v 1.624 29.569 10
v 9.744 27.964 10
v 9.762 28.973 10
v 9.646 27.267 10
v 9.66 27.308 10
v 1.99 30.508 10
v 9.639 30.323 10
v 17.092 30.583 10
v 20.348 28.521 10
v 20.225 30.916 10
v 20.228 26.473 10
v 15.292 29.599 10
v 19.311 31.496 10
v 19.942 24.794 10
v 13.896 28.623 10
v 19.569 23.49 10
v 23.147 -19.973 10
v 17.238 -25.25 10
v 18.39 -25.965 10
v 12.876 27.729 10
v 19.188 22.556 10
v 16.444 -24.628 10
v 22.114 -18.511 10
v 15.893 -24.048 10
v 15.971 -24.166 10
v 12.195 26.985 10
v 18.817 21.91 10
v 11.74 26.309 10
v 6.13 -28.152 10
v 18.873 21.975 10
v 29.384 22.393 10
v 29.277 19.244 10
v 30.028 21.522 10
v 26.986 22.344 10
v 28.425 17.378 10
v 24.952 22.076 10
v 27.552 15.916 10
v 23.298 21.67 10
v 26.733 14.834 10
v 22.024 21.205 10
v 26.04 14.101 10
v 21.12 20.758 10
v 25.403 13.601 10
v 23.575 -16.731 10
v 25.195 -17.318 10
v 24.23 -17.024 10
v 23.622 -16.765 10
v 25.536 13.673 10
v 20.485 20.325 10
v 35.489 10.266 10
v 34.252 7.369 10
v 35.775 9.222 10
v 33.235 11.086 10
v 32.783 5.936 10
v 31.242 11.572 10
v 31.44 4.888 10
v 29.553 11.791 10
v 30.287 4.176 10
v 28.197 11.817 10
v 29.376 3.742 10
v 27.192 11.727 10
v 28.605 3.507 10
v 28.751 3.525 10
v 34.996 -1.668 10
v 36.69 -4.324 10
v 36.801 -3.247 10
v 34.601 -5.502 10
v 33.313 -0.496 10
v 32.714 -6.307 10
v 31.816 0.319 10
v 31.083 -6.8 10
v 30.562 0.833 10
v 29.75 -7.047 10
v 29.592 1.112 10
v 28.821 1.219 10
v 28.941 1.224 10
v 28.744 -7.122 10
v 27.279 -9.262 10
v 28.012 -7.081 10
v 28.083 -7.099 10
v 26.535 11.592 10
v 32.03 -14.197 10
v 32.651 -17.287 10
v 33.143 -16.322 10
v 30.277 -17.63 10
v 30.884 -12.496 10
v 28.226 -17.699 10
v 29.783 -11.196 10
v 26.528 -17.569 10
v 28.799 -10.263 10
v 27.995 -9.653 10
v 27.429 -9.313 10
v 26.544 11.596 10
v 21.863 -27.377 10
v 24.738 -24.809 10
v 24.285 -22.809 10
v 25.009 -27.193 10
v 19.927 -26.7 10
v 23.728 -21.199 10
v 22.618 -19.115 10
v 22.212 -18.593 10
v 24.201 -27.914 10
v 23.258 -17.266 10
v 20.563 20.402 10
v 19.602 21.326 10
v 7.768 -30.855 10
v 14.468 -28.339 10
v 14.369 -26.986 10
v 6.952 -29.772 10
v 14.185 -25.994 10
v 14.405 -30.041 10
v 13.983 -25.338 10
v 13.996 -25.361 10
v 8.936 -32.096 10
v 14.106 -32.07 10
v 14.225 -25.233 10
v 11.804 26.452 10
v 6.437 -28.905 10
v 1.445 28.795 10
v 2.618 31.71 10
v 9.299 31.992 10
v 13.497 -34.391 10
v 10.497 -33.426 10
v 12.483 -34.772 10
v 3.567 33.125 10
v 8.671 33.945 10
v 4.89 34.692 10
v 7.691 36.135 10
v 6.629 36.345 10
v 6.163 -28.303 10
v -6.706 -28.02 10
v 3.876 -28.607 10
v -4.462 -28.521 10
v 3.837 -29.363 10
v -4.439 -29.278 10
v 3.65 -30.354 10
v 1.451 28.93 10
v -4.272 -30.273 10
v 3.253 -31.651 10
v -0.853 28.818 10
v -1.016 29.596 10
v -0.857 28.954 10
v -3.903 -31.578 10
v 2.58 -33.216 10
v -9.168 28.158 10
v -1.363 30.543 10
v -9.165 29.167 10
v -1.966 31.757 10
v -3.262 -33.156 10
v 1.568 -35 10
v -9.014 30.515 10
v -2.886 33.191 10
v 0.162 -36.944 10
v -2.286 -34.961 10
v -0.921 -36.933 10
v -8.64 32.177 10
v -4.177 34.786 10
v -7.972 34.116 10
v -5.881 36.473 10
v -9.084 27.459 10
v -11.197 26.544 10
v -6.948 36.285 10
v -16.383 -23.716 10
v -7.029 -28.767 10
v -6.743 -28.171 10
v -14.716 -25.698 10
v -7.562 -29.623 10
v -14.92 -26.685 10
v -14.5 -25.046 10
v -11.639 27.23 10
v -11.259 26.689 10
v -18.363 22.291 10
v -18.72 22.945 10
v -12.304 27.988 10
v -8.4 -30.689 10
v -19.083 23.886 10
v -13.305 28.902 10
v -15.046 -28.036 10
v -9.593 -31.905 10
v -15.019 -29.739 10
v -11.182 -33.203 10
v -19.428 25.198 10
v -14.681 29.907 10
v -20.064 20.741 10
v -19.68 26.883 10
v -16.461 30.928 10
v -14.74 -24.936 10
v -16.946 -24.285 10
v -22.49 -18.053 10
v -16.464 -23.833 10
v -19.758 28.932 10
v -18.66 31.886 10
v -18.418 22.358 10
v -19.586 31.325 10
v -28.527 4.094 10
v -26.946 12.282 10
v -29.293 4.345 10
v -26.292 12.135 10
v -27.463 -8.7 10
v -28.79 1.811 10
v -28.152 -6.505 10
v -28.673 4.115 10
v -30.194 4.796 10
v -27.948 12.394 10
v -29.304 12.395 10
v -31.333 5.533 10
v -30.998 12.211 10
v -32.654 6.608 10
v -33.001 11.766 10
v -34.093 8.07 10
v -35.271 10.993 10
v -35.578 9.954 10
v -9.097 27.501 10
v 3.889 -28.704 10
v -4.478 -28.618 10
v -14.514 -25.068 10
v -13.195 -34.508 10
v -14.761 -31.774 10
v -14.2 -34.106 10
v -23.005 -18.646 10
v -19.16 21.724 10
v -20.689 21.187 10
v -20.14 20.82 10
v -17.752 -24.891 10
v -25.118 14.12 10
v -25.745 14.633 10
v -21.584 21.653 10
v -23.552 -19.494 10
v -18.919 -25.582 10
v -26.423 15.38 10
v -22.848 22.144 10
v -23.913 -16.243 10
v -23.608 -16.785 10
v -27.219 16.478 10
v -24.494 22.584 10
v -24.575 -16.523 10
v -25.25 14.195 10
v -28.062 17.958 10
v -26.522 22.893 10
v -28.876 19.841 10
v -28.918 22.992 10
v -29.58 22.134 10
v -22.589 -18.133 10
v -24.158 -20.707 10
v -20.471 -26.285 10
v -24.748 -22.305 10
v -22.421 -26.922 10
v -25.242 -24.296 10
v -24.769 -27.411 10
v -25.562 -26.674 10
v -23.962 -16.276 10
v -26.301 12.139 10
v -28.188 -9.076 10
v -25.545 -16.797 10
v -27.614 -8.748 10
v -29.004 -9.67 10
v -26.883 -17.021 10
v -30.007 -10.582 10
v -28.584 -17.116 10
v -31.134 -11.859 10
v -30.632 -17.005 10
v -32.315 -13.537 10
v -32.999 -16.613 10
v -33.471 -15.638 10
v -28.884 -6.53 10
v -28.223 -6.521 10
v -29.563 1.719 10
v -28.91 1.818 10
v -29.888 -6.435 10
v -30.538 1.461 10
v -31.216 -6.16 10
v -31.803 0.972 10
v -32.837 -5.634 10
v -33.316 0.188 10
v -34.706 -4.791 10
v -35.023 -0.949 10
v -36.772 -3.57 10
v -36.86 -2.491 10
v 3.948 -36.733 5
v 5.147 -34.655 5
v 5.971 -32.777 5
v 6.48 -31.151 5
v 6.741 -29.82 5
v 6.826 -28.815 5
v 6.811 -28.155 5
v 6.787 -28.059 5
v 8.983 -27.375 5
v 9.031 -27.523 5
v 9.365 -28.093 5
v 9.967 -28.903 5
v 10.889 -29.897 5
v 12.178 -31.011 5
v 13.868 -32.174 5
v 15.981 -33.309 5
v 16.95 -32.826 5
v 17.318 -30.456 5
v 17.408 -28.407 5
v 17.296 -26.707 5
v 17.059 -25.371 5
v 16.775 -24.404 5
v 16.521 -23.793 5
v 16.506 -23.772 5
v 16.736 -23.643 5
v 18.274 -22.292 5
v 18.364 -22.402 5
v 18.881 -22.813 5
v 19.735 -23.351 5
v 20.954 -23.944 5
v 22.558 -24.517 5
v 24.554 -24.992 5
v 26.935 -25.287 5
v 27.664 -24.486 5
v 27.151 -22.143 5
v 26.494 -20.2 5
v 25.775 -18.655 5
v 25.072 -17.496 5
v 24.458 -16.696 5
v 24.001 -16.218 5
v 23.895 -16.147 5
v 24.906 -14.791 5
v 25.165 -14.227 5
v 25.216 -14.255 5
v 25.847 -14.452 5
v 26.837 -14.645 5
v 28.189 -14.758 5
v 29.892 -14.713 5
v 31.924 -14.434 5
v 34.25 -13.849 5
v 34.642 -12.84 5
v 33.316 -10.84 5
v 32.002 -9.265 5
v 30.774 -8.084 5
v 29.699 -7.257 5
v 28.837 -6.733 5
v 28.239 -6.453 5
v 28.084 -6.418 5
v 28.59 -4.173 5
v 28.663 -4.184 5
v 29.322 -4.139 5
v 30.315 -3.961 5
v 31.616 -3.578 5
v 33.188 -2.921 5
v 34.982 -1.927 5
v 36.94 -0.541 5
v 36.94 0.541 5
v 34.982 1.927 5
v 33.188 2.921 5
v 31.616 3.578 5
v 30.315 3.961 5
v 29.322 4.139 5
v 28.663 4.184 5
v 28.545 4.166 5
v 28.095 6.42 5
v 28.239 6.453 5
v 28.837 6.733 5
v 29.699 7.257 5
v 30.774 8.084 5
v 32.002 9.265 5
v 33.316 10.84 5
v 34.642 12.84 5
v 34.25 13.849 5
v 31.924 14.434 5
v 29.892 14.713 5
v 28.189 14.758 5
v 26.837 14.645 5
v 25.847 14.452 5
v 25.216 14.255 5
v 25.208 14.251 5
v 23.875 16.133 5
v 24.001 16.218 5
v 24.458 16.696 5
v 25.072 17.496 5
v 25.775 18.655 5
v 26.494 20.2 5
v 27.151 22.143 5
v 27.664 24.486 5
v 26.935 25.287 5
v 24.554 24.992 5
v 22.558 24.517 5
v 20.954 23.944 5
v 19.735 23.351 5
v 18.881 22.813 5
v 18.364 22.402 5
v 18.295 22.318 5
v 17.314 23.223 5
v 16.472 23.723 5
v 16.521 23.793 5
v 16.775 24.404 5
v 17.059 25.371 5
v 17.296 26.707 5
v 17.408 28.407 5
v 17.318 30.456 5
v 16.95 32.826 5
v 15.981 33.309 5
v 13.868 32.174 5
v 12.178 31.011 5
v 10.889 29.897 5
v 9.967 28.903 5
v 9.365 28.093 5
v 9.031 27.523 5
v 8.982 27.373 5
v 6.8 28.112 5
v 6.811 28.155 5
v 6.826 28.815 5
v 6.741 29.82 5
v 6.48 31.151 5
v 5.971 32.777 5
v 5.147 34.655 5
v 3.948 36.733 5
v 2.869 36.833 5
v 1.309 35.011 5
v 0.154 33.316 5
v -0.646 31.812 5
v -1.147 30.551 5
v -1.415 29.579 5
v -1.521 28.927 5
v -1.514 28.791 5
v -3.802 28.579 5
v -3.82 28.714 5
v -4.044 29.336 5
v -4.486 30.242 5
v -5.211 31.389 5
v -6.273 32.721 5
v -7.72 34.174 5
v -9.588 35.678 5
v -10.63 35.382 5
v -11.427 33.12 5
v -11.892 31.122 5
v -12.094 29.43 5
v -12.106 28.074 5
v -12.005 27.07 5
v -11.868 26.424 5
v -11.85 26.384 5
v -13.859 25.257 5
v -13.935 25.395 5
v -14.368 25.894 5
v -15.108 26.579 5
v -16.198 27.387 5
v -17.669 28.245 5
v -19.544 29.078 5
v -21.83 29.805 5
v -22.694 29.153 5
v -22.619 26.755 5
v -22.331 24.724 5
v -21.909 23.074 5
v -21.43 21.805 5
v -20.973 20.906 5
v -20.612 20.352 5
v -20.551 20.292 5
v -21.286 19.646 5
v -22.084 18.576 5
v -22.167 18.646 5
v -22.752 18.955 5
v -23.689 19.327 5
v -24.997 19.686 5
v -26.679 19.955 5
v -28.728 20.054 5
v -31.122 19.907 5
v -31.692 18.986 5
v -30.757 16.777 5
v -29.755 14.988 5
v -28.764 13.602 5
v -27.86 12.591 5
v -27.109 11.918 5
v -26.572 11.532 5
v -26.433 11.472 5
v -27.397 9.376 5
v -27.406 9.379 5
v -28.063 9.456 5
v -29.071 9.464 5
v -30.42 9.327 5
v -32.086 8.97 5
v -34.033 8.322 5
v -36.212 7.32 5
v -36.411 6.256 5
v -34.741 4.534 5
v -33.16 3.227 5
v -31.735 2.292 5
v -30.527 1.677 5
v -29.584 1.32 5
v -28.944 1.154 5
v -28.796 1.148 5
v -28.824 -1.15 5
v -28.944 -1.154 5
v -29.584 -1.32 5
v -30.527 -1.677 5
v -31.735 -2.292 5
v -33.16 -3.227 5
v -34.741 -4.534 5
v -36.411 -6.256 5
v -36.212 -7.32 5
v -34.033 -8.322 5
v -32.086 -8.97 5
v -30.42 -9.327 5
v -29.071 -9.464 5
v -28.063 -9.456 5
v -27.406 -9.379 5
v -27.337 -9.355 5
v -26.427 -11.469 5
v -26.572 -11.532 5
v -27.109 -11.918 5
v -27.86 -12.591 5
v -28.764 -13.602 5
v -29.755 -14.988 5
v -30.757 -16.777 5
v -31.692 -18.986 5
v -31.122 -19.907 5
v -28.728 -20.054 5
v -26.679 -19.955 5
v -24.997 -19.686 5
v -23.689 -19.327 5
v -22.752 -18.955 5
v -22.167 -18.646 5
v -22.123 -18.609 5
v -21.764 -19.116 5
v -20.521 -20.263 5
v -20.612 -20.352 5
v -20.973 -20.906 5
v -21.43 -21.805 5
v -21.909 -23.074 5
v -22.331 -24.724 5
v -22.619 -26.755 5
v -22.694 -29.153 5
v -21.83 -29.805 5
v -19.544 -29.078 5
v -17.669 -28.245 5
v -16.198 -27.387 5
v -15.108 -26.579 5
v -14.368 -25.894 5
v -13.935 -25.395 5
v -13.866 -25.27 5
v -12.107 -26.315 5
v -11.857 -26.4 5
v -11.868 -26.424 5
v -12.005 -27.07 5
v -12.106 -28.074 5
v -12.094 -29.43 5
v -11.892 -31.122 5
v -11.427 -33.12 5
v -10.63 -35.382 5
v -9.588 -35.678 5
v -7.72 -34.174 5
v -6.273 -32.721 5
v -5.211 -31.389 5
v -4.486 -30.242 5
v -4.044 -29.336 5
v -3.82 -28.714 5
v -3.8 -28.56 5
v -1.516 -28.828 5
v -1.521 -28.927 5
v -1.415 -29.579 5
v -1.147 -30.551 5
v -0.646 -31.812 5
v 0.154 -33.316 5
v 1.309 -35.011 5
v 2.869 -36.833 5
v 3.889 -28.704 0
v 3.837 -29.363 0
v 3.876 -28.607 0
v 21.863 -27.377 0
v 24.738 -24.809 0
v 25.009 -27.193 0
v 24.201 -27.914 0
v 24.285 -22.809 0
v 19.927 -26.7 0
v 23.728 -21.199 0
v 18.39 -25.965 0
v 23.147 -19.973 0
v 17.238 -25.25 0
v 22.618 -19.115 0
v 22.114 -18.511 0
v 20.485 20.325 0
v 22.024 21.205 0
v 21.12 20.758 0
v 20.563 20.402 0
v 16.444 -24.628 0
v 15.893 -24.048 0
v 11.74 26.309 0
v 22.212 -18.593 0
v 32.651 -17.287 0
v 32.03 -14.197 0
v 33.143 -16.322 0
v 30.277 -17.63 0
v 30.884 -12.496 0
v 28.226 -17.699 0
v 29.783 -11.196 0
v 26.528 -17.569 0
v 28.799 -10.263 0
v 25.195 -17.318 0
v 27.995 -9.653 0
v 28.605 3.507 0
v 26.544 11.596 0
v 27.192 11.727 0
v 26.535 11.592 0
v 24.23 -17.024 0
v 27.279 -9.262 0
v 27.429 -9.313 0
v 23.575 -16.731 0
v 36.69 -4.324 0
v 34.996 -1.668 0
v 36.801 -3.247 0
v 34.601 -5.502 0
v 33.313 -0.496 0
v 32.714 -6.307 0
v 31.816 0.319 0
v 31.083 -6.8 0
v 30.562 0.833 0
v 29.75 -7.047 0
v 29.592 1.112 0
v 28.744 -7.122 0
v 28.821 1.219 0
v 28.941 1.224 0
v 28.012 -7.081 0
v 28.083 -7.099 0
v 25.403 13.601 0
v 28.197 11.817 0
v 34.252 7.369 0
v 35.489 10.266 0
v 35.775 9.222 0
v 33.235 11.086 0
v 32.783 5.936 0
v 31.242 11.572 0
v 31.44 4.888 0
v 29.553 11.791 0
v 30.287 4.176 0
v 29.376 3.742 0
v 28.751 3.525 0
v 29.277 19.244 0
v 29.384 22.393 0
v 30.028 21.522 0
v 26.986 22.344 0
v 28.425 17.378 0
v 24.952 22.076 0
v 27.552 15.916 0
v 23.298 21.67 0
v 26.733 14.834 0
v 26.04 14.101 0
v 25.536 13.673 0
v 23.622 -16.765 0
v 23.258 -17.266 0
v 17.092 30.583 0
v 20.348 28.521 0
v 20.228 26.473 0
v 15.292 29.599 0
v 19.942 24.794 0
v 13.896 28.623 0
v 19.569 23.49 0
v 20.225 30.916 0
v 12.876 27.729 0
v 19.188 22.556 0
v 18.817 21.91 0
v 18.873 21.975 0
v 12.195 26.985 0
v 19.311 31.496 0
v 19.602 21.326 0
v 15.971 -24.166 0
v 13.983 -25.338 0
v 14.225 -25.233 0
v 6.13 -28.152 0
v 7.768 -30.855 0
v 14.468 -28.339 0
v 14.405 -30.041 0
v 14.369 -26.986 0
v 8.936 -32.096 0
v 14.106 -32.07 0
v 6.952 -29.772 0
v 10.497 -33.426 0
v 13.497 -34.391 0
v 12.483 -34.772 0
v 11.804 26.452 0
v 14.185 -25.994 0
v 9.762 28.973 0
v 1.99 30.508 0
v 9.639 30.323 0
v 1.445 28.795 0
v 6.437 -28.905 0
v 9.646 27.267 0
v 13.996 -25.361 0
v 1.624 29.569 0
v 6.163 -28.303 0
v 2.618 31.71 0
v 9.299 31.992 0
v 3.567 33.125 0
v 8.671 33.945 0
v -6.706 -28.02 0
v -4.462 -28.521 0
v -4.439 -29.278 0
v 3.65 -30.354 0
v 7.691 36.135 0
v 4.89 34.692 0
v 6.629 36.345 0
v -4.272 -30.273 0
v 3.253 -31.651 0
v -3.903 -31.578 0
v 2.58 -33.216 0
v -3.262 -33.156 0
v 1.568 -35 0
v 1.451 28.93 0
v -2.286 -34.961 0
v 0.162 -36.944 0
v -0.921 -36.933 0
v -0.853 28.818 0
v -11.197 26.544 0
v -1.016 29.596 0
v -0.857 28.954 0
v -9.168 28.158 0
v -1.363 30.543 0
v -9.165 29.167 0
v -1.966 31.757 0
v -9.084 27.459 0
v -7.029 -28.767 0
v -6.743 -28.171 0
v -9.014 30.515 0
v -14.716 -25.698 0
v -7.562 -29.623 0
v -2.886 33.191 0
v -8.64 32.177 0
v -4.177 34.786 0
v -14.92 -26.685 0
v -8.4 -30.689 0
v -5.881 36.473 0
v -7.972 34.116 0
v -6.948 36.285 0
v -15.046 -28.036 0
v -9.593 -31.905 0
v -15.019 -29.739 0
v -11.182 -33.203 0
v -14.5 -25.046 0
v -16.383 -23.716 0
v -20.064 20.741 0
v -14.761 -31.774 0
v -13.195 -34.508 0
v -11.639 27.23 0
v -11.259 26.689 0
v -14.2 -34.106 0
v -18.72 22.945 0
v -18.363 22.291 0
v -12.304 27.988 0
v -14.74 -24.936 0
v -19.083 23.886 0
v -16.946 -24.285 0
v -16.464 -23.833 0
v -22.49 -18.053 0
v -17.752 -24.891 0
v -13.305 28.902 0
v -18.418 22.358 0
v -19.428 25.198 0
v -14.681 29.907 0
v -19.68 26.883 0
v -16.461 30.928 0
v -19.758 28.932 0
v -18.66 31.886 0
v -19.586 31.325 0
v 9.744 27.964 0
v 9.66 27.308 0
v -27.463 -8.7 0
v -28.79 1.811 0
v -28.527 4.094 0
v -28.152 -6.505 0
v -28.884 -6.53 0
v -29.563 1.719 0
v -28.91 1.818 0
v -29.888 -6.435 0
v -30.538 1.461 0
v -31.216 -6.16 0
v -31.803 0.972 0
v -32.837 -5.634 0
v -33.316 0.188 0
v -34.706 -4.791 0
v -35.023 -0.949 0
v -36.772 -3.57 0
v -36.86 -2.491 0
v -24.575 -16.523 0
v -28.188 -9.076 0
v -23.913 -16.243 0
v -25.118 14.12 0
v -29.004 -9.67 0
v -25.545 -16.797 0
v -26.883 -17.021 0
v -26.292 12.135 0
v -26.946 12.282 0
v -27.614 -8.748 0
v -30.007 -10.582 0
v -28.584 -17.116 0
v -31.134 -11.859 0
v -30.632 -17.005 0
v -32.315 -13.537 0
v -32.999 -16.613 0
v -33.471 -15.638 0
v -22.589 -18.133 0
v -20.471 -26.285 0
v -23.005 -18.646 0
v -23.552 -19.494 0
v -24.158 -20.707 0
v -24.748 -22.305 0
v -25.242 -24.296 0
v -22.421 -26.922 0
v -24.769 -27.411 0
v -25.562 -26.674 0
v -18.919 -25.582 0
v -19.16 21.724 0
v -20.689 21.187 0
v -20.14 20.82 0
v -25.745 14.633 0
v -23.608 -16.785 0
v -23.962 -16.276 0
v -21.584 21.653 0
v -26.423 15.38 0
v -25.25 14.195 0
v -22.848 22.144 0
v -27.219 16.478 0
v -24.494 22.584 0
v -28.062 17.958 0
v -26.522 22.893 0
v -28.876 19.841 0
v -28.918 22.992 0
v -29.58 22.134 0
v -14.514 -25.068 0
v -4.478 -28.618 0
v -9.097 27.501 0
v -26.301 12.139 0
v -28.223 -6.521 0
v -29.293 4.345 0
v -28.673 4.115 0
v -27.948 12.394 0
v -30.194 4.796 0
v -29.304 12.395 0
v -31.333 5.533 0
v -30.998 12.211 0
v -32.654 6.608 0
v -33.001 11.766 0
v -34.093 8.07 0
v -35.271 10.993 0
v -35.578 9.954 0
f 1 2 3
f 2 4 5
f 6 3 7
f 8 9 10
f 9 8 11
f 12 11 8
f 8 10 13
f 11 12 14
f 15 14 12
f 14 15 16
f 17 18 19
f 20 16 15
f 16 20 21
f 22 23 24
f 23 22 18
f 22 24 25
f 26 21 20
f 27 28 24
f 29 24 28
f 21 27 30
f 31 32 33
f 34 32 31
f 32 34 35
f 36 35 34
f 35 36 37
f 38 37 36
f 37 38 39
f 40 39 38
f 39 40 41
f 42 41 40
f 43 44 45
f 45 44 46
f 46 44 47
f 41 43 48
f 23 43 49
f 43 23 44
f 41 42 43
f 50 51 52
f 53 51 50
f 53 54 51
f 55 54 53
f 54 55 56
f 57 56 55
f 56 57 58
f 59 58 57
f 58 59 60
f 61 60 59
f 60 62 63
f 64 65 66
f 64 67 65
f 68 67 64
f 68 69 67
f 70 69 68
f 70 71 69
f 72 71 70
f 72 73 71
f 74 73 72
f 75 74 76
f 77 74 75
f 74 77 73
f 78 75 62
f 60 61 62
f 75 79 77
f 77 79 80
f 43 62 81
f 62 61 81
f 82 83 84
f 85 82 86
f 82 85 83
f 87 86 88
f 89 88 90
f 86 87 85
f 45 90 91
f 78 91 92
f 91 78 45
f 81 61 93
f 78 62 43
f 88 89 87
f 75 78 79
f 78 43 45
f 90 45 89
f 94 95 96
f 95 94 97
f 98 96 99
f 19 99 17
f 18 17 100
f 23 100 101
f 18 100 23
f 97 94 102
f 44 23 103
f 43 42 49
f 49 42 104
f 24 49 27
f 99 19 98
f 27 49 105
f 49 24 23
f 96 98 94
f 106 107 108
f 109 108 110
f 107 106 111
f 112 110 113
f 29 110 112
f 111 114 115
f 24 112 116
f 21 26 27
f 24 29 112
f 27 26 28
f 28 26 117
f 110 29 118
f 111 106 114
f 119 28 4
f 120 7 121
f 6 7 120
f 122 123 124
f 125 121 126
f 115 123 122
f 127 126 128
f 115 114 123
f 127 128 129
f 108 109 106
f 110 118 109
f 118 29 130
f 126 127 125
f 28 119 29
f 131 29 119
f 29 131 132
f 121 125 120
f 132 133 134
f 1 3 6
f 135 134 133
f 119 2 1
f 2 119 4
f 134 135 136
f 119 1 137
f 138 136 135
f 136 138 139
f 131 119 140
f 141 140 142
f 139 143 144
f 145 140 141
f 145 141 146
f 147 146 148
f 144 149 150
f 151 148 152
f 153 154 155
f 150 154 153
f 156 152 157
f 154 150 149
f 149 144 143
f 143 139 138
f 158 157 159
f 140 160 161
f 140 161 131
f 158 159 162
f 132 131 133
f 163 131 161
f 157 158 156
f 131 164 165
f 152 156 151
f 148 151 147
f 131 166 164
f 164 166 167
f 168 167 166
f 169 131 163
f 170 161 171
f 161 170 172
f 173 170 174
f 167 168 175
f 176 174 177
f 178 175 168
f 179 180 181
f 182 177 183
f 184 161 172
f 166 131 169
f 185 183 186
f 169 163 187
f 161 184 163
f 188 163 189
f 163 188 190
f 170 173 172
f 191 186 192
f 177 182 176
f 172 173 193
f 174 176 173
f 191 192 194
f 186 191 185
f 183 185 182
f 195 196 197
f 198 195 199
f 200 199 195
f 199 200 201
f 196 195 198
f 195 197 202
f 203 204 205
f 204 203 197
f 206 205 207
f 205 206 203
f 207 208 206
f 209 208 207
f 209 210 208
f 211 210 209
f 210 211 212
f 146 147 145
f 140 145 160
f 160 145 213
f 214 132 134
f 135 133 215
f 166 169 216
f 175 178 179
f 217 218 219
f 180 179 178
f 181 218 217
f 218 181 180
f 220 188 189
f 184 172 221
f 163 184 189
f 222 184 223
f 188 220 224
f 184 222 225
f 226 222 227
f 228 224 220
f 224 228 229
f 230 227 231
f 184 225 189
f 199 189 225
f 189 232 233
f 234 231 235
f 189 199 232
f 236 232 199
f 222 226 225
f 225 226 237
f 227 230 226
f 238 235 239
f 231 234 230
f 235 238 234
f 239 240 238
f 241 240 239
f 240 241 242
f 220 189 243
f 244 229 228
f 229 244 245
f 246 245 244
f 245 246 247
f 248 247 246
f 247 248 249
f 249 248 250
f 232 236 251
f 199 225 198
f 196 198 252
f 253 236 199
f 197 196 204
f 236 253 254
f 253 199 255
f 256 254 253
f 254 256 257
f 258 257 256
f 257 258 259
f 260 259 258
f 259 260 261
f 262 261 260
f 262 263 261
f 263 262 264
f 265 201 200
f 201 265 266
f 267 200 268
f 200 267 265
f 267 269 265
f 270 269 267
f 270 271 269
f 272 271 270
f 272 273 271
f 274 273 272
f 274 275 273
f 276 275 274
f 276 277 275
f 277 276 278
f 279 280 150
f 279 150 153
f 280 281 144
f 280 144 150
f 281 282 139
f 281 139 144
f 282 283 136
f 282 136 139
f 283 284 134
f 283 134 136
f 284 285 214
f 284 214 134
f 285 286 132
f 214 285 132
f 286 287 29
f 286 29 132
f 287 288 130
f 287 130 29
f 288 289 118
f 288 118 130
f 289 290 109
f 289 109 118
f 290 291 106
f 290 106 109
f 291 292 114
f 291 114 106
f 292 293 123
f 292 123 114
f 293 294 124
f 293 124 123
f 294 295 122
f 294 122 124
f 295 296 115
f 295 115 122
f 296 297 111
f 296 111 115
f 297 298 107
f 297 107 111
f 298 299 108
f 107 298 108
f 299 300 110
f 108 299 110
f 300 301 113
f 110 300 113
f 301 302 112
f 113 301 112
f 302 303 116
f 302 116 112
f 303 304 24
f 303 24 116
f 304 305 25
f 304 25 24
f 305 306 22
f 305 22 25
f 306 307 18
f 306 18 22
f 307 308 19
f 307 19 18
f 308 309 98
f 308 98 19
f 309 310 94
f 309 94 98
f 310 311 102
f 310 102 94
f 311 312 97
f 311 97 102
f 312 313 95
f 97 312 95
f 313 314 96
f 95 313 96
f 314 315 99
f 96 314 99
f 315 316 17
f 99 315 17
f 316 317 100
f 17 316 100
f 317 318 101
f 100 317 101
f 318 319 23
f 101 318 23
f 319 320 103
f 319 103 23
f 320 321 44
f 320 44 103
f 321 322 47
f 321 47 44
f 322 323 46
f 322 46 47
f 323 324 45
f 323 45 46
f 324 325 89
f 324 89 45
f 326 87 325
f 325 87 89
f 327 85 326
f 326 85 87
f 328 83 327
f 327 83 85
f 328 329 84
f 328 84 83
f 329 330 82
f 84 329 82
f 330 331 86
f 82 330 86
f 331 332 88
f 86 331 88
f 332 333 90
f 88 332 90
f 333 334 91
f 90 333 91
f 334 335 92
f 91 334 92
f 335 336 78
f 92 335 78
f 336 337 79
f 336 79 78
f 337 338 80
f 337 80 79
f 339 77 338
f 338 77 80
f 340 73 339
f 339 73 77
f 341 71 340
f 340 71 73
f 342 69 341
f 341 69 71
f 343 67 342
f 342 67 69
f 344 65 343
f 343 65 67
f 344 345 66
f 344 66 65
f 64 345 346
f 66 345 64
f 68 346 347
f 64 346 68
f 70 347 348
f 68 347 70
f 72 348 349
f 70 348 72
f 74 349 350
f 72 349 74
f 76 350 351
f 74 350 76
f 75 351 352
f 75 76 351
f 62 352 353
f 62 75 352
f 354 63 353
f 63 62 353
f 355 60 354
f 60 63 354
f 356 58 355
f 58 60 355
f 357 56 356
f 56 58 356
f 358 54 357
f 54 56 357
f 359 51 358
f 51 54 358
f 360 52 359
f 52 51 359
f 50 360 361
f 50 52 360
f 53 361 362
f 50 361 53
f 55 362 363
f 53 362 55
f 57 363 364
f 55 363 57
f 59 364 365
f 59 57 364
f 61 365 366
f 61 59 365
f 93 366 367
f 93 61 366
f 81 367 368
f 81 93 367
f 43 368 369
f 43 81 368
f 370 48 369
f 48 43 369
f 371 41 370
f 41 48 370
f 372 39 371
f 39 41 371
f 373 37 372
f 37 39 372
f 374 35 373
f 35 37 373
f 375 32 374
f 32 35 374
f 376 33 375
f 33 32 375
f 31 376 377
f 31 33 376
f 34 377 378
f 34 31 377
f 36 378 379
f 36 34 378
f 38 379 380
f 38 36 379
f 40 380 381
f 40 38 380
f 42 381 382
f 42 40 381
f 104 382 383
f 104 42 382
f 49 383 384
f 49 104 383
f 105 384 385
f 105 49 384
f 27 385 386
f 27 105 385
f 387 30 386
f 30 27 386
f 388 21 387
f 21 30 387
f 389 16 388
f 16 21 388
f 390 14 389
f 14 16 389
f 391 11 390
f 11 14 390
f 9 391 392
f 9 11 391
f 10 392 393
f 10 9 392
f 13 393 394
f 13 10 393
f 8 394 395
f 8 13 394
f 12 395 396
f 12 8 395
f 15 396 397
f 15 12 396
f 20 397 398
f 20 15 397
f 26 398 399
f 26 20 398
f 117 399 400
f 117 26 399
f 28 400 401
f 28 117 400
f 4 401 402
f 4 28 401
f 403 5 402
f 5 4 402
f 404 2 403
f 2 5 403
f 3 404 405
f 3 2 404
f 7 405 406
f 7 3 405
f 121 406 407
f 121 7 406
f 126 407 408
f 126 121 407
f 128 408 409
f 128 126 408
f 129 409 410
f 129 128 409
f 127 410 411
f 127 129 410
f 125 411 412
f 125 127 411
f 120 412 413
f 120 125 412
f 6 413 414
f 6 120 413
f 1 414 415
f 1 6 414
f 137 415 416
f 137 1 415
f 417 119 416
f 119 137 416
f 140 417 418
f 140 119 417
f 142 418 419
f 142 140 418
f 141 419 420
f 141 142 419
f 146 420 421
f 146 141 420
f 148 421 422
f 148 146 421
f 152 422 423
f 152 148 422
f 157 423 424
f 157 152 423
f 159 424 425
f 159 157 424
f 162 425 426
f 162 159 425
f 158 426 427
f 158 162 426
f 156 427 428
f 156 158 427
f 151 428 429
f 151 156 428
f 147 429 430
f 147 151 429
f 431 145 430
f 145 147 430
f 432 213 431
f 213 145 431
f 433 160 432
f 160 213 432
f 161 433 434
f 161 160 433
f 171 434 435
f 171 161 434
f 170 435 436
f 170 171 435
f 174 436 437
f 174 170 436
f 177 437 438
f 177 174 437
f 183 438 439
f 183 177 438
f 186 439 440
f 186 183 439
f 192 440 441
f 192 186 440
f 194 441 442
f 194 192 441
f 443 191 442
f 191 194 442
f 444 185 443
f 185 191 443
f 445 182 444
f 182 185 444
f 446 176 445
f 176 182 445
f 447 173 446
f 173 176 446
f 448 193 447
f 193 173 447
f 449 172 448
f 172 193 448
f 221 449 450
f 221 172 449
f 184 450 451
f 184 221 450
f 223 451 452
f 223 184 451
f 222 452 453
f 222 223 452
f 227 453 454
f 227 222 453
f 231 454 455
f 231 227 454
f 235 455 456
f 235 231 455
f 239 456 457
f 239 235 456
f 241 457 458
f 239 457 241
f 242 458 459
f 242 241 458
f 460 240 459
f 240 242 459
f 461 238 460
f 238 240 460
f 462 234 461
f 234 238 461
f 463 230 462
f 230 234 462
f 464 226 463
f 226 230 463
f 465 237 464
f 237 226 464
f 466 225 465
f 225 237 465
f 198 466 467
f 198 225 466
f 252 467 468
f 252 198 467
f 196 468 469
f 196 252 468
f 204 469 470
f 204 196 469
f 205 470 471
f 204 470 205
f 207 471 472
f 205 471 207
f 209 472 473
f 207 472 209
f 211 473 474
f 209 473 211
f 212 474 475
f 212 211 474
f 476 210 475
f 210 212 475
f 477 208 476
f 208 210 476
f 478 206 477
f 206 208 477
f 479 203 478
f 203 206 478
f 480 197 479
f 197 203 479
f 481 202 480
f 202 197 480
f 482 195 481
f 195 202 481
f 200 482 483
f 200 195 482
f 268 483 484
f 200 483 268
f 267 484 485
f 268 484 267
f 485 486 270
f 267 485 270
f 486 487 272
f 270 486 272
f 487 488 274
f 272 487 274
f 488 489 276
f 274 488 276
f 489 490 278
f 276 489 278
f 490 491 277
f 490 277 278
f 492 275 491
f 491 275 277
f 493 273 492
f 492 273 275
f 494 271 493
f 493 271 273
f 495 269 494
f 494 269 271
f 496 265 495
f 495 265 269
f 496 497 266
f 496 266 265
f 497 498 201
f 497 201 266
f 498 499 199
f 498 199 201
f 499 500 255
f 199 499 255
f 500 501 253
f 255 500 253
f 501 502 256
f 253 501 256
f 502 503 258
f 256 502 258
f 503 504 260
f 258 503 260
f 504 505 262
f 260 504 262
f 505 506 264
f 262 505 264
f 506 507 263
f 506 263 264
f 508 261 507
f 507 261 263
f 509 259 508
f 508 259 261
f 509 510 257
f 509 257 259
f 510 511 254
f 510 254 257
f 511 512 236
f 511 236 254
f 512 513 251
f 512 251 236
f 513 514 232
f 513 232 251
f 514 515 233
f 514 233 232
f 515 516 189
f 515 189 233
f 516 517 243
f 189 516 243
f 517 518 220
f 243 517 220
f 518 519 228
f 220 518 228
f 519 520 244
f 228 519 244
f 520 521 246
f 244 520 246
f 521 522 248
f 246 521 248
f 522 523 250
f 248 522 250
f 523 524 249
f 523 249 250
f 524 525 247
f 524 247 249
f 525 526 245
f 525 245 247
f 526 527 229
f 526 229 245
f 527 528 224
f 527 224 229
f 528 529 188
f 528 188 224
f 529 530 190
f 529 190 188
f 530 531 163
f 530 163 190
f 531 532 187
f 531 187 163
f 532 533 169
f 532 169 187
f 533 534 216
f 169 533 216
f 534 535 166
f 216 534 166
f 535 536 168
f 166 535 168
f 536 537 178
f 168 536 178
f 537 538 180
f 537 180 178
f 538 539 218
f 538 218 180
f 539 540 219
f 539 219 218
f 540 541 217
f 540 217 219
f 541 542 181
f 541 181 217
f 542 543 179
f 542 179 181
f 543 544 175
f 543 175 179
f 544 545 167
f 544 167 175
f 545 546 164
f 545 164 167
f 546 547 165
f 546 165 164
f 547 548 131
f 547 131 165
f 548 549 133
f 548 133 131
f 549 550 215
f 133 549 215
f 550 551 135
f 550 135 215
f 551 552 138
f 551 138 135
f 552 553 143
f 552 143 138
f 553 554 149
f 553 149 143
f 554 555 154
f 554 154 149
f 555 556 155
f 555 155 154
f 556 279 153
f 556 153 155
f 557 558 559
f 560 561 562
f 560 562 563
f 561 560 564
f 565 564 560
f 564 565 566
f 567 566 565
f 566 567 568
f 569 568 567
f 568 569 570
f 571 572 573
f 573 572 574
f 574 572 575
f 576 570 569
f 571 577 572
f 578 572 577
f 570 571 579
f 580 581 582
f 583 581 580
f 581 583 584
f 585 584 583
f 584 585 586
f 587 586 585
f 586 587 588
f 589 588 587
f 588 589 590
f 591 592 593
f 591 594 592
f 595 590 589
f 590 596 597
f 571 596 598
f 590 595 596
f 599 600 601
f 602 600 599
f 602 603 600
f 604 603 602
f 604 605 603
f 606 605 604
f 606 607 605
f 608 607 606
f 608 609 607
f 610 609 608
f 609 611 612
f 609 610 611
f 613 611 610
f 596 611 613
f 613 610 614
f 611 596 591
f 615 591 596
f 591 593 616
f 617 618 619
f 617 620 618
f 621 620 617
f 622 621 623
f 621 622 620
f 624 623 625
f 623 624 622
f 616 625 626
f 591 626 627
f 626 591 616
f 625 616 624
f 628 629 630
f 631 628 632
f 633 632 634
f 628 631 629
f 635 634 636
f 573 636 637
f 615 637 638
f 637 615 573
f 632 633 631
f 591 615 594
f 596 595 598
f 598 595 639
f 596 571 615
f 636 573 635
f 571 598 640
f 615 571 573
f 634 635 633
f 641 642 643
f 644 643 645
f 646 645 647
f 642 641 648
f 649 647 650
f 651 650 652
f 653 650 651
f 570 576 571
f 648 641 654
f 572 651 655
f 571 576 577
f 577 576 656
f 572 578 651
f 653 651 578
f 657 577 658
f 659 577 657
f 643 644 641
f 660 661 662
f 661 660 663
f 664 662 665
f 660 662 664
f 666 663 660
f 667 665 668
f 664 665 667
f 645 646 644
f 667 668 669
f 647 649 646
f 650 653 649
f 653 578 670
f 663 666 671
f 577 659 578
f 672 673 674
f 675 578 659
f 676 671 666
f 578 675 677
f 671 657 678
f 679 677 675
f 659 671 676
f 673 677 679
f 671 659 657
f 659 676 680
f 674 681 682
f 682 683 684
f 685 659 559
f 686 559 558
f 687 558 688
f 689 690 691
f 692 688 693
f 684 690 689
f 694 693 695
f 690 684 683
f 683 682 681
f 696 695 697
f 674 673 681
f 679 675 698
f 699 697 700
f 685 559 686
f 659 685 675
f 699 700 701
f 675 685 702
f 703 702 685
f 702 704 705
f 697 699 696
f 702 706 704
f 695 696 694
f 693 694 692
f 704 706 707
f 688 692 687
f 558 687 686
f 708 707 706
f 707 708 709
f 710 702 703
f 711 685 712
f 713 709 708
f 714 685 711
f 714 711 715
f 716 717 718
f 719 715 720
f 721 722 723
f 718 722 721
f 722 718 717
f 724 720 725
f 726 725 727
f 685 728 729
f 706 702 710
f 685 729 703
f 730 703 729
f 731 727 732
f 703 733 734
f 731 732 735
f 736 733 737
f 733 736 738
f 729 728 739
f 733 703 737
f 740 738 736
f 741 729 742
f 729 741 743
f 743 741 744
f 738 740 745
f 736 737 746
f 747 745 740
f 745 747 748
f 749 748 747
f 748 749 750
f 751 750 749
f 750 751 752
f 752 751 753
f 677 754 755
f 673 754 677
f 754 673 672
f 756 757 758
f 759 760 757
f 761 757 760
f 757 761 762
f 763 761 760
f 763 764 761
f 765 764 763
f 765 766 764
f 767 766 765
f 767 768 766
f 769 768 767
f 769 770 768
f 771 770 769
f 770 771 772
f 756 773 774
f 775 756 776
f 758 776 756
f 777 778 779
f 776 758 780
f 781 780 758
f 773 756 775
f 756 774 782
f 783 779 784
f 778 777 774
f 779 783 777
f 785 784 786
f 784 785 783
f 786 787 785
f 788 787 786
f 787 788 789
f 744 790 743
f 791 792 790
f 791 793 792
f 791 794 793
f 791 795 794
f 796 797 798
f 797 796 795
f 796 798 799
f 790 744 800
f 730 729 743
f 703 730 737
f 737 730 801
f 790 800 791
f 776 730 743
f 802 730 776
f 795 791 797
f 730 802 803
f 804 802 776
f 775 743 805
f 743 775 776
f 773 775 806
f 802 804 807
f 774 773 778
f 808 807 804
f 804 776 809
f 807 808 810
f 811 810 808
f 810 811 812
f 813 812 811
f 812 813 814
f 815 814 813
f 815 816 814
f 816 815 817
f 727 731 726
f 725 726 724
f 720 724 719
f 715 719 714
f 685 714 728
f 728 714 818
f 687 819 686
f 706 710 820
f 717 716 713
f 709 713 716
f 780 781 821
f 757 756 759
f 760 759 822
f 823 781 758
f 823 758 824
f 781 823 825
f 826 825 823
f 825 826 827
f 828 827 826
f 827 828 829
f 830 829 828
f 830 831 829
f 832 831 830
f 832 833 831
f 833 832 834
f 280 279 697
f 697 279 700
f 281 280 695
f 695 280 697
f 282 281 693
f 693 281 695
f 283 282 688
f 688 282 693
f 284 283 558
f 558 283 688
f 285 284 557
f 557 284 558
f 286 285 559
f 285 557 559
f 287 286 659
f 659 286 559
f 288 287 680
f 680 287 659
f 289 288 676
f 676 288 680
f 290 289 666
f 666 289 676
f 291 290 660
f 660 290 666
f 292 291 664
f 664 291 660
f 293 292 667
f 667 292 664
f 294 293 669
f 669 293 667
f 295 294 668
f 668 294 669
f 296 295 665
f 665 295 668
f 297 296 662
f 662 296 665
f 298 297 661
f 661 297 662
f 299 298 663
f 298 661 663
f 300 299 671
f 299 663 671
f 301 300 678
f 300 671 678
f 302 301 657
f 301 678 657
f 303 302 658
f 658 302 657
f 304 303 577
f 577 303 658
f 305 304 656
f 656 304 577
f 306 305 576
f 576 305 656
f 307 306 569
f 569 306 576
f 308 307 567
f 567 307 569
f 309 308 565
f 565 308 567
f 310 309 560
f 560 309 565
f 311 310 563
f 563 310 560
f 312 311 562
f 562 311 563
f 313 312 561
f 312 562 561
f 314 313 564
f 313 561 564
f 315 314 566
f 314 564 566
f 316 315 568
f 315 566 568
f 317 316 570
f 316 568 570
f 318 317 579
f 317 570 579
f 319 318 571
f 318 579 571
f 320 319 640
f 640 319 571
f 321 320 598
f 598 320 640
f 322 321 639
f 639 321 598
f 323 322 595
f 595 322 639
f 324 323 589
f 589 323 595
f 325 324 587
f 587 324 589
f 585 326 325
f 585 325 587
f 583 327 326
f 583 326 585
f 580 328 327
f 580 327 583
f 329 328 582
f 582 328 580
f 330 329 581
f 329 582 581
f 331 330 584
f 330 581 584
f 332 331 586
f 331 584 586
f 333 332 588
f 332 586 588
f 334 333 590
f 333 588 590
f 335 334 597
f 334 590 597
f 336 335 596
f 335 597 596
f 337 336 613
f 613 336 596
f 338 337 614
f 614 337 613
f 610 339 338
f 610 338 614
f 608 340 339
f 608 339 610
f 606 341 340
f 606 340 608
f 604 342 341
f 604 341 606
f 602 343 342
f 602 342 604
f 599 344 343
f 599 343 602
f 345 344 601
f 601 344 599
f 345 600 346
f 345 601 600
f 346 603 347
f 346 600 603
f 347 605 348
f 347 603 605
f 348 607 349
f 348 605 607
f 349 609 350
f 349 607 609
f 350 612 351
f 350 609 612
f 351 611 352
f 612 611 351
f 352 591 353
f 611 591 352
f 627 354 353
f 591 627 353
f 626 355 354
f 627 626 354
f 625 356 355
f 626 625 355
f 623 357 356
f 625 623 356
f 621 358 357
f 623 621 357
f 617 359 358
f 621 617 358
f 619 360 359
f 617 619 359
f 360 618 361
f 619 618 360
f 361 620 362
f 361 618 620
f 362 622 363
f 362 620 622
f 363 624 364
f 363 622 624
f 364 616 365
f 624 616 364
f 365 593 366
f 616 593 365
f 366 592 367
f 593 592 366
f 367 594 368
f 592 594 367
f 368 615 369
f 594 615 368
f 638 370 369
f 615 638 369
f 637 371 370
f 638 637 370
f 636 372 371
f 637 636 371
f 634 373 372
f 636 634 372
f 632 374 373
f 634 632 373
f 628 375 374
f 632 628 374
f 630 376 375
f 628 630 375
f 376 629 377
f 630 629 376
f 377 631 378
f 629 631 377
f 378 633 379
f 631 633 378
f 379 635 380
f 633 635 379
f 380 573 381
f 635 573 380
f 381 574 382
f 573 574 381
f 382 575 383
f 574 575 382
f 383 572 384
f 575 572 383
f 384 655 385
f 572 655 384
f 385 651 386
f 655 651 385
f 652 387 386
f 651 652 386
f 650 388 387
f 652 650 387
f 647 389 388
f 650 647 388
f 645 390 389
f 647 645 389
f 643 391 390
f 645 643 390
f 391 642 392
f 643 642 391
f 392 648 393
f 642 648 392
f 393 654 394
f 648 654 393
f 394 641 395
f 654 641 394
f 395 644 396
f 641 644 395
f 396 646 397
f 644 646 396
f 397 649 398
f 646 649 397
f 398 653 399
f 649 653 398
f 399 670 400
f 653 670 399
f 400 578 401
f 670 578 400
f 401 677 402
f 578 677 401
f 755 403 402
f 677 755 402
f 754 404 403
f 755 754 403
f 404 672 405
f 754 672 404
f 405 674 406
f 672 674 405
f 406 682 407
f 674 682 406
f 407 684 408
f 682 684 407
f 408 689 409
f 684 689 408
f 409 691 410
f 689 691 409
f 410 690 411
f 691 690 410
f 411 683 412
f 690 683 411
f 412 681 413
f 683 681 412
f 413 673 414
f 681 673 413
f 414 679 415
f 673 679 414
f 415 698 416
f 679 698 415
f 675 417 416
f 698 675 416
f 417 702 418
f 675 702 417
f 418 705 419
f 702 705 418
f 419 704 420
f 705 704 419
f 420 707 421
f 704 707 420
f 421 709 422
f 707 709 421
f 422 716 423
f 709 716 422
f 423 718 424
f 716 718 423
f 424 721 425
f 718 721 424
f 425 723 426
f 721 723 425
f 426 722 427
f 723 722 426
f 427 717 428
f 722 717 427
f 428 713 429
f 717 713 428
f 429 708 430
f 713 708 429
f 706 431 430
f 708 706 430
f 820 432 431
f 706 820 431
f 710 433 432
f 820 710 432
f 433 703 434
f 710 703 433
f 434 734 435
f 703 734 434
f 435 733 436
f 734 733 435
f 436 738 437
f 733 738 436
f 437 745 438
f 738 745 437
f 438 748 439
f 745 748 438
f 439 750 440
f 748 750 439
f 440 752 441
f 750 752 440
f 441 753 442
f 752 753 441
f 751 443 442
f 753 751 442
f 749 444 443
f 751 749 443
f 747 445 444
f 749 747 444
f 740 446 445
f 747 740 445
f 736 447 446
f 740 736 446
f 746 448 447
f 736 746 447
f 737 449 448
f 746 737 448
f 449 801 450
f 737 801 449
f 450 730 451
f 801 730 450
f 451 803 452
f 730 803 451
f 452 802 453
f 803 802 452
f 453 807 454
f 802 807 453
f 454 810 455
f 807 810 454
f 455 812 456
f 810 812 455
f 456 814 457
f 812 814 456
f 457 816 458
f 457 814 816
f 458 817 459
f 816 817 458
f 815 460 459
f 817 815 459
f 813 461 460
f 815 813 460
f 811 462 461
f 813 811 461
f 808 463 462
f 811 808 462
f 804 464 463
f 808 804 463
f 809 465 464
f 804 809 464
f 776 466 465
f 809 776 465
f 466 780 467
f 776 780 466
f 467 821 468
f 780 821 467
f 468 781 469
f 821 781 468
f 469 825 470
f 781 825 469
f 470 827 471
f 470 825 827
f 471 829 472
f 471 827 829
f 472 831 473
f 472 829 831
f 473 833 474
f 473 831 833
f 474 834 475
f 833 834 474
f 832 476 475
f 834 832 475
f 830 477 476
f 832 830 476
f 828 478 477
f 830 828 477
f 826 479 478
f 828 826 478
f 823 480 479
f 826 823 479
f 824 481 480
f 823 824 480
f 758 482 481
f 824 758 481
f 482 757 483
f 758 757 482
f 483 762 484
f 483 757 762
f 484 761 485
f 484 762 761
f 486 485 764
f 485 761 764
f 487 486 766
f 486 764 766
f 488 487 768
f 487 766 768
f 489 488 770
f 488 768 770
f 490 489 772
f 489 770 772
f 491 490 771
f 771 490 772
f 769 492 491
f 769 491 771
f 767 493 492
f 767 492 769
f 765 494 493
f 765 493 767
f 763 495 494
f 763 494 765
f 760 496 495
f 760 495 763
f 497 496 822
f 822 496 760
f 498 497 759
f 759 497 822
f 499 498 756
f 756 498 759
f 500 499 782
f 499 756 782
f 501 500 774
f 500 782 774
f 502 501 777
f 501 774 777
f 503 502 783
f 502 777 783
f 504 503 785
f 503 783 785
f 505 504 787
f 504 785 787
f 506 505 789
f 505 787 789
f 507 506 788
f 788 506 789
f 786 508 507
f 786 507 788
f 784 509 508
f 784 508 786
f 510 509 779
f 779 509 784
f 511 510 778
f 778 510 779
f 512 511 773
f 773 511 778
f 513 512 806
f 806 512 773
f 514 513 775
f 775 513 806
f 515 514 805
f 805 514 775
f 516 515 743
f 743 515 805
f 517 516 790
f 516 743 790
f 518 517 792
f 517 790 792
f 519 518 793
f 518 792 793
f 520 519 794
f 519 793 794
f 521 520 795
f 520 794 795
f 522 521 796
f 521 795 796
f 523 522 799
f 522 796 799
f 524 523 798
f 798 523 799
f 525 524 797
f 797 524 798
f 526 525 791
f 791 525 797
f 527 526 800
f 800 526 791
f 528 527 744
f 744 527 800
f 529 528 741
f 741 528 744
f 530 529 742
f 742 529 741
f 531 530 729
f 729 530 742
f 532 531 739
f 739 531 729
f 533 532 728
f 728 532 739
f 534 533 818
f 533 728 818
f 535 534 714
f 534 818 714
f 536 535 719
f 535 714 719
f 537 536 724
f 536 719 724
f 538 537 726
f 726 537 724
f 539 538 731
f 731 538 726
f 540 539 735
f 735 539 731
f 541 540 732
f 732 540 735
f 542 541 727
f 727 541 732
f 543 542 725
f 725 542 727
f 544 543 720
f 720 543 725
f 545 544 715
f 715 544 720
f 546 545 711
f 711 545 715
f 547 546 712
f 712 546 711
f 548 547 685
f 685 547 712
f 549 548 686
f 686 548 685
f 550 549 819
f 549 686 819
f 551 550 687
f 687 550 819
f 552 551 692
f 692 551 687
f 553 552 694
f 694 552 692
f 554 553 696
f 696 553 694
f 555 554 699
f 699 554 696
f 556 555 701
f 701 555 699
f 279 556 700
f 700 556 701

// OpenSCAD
// Parametric Involute Bevel and Spur Gears by GregFrost
// It is licensed under the Creative Commons - GNU GPL license.
// © 2010 by GregFrost
// http://www.thingiverse.com/thing:3575

// addition of resolution controls by Kyle P. Ronan - 2013

// Meshing Double Helix:
//meshing_double_helix ();

pi=3.1415926535897932384626433832795;

//==================================================

function HerringBoneGearThickness() = 10;




module gear (
	number_of_teeth=15,
	circular_pitch=false, diametral_pitch=false,
	pressure_angle=28,
	clearance = 0.2,
	gear_thickness=5,
	rim_thickness=8,
	rim_width=5,
	backlash=0,
	twist=0,
	involute_facets=0)
{
	if (circular_pitch==false && diametral_pitch==false) 
		echo("MCAD ERROR: gear module needs either a diametral_pitch or circular_pitch");

	// Pitch diameter: Diameter of pitch circle.
	pitch_diameter  =  number_of_teeth * circular_pitch / 180;
	pitch_radius = pitch_diameter/2;
	echo ("Teeth:", number_of_teeth, " Pitch radius:", pitch_radius);

	// Base Circle
	base_radius = pitch_radius*cos(pressure_angle);

	// Diametrial pitch: Number of teeth per unit length.
	pitch_diametrial = number_of_teeth / pitch_diameter;

	// Addendum: Radial distance from pitch circle to outside circle.
	addendum = 1/pitch_diametrial;

	//Outer Circle
	outer_radius = pitch_radius+addendum;

	// Dedendum: Radial distance from pitch circle to root diameter
	dedendum = addendum + clearance;

	// Root diameter: Diameter of bottom of tooth spaces.
	root_radius = pitch_radius-dedendum;
	backlash_angle = backlash / pitch_radius * 180 / pi;
	half_thick_angle = (360 / number_of_teeth - backlash_angle) / 4;

	// Variables controlling the rim.
	rim_radius = root_radius - rim_width;

	difference ()
	{
		union ()
		{
			difference ()
			{
				linear_extrude (height=rim_thickness, convexity=10, twist=twist)
				gear_shape (
					number_of_teeth,
					pitch_radius = pitch_radius,
					root_radius = root_radius,
					base_radius = base_radius,
					outer_radius = outer_radius,
					half_thick_angle = half_thick_angle,
					involute_facets=involute_facets);
			}
			if (gear_thickness > rim_thickness)
				cylinder (r=rim_radius,h=gear_thickness);
		}
		
		
	}
}

module gear_shape (
	number_of_teeth,
	pitch_radius,
	root_radius,
	base_radius,
	outer_radius,
	half_thick_angle,
	involute_facets,
	circle_facets)
{
	union()
	{
		rotate (half_thick_angle) circle ($fn=number_of_teeth*circle_facets, r=root_radius);

		for (i = [1:number_of_teeth])
		{
			rotate ([0,0,i*360/number_of_teeth])
			{
				involute_gear_tooth (
					pitch_radius = pitch_radius,
					root_radius = root_radius,
					base_radius = base_radius,
					outer_radius = outer_radius,
					half_thick_angle = half_thick_angle,
					involute_facets=involute_facets);
			}
		}
	}
}

module involute_gear_tooth (
	pitch_radius,
	root_radius,
	base_radius,
	outer_radius,
	half_thick_angle,
	involute_facets)
{
	min_radius = max (base_radius,root_radius);

	pitch_point = involute (base_radius, involute_intersect_angle (base_radius, pitch_radius));
	pitch_angle = atan2 (pitch_point[1], pitch_point[0]);
	centre_angle = pitch_angle + half_thick_angle;

	start_angle = involute_intersect_angle (base_radius, min_radius);
	stop_angle = involute_intersect_angle (base_radius, outer_radius);

	res=(involute_facets!=0)?involute_facets:($fn==0)?5:$fn/4;

	union ()
	{
		for (i=[1:res])
		assign (
			point1=involute (base_radius,start_angle+(stop_angle - start_angle)*(i-1)/res),
			point2=involute (base_radius,start_angle+(stop_angle - start_angle)*i/res))
		{
			assign (
				side1_point1=rotate_point (centre_angle, point1),
				side1_point2=rotate_point (centre_angle, point2),
				side2_point1=mirror_point (rotate_point (centre_angle, point1)),
				side2_point2=mirror_point (rotate_point (centre_angle, point2)))
			{
				polygon (
					points=[[0,0],side1_point1,side1_point2,side2_point2,side2_point1],
					paths=[[0,1,2,3,4,0]]);
			}
		}
	}
}

// Mathematical Functions
//===============

// Finds the angle of the involute about the base radius at the given distance (radius) from it's center.
//source: http://www.mathhelpforum.com/math-help/geometry/136011-circle-involute-solving-y-any-given-x.html

function involute_intersect_angle (base_radius, radius) = sqrt (pow (radius/base_radius, 2) - 1) * 180 / pi;


function mirror_point (coord) = 
[
	coord[0], 
	-coord[1]
];

function rotate_point (rotate, coord) =
[
	cos (rotate) * coord[0] + sin (rotate) * coord[1],
	cos (rotate) * coord[1] - sin (rotate) * coord[0]
];

function involute (base_radius, involute_angle) = 
[
	base_radius*(cos (involute_angle) + involute_angle*pi/180*sin (involute_angle)),
	base_radius*(sin (involute_angle) - involute_angle*pi/180*cos (involute_angle)),
];


// Test Cases
//===============

module double_helix_gear (
	teeth=17)
{
	//double helical gear
	twist=100;
	height=HerringBoneGearThickness();
	pressure_angle=30;
	
	translate([0,0,height/2])
	{
		
			gear (number_of_teeth=teeth,
				circular_pitch=700,
				pressure_angle=pressure_angle,
				clearance = 0.2,
				gear_thickness = height/2*0.5,
				rim_thickness = height/2,
				rim_width = 5,
				twist=twist/teeth,
				involute_facets=6);
			mirror([0,0,1])
			gear (number_of_teeth=teeth,
				circular_pitch=700,
				pressure_angle=pressure_angle,
				clearance = 0.2,
				gear_thickness = height/2,
				rim_thickness = height/2,
				rim_width = 5,
				twist=twist/teeth,
				involute_facets=6);		
	}
}

double_helix_gear();
